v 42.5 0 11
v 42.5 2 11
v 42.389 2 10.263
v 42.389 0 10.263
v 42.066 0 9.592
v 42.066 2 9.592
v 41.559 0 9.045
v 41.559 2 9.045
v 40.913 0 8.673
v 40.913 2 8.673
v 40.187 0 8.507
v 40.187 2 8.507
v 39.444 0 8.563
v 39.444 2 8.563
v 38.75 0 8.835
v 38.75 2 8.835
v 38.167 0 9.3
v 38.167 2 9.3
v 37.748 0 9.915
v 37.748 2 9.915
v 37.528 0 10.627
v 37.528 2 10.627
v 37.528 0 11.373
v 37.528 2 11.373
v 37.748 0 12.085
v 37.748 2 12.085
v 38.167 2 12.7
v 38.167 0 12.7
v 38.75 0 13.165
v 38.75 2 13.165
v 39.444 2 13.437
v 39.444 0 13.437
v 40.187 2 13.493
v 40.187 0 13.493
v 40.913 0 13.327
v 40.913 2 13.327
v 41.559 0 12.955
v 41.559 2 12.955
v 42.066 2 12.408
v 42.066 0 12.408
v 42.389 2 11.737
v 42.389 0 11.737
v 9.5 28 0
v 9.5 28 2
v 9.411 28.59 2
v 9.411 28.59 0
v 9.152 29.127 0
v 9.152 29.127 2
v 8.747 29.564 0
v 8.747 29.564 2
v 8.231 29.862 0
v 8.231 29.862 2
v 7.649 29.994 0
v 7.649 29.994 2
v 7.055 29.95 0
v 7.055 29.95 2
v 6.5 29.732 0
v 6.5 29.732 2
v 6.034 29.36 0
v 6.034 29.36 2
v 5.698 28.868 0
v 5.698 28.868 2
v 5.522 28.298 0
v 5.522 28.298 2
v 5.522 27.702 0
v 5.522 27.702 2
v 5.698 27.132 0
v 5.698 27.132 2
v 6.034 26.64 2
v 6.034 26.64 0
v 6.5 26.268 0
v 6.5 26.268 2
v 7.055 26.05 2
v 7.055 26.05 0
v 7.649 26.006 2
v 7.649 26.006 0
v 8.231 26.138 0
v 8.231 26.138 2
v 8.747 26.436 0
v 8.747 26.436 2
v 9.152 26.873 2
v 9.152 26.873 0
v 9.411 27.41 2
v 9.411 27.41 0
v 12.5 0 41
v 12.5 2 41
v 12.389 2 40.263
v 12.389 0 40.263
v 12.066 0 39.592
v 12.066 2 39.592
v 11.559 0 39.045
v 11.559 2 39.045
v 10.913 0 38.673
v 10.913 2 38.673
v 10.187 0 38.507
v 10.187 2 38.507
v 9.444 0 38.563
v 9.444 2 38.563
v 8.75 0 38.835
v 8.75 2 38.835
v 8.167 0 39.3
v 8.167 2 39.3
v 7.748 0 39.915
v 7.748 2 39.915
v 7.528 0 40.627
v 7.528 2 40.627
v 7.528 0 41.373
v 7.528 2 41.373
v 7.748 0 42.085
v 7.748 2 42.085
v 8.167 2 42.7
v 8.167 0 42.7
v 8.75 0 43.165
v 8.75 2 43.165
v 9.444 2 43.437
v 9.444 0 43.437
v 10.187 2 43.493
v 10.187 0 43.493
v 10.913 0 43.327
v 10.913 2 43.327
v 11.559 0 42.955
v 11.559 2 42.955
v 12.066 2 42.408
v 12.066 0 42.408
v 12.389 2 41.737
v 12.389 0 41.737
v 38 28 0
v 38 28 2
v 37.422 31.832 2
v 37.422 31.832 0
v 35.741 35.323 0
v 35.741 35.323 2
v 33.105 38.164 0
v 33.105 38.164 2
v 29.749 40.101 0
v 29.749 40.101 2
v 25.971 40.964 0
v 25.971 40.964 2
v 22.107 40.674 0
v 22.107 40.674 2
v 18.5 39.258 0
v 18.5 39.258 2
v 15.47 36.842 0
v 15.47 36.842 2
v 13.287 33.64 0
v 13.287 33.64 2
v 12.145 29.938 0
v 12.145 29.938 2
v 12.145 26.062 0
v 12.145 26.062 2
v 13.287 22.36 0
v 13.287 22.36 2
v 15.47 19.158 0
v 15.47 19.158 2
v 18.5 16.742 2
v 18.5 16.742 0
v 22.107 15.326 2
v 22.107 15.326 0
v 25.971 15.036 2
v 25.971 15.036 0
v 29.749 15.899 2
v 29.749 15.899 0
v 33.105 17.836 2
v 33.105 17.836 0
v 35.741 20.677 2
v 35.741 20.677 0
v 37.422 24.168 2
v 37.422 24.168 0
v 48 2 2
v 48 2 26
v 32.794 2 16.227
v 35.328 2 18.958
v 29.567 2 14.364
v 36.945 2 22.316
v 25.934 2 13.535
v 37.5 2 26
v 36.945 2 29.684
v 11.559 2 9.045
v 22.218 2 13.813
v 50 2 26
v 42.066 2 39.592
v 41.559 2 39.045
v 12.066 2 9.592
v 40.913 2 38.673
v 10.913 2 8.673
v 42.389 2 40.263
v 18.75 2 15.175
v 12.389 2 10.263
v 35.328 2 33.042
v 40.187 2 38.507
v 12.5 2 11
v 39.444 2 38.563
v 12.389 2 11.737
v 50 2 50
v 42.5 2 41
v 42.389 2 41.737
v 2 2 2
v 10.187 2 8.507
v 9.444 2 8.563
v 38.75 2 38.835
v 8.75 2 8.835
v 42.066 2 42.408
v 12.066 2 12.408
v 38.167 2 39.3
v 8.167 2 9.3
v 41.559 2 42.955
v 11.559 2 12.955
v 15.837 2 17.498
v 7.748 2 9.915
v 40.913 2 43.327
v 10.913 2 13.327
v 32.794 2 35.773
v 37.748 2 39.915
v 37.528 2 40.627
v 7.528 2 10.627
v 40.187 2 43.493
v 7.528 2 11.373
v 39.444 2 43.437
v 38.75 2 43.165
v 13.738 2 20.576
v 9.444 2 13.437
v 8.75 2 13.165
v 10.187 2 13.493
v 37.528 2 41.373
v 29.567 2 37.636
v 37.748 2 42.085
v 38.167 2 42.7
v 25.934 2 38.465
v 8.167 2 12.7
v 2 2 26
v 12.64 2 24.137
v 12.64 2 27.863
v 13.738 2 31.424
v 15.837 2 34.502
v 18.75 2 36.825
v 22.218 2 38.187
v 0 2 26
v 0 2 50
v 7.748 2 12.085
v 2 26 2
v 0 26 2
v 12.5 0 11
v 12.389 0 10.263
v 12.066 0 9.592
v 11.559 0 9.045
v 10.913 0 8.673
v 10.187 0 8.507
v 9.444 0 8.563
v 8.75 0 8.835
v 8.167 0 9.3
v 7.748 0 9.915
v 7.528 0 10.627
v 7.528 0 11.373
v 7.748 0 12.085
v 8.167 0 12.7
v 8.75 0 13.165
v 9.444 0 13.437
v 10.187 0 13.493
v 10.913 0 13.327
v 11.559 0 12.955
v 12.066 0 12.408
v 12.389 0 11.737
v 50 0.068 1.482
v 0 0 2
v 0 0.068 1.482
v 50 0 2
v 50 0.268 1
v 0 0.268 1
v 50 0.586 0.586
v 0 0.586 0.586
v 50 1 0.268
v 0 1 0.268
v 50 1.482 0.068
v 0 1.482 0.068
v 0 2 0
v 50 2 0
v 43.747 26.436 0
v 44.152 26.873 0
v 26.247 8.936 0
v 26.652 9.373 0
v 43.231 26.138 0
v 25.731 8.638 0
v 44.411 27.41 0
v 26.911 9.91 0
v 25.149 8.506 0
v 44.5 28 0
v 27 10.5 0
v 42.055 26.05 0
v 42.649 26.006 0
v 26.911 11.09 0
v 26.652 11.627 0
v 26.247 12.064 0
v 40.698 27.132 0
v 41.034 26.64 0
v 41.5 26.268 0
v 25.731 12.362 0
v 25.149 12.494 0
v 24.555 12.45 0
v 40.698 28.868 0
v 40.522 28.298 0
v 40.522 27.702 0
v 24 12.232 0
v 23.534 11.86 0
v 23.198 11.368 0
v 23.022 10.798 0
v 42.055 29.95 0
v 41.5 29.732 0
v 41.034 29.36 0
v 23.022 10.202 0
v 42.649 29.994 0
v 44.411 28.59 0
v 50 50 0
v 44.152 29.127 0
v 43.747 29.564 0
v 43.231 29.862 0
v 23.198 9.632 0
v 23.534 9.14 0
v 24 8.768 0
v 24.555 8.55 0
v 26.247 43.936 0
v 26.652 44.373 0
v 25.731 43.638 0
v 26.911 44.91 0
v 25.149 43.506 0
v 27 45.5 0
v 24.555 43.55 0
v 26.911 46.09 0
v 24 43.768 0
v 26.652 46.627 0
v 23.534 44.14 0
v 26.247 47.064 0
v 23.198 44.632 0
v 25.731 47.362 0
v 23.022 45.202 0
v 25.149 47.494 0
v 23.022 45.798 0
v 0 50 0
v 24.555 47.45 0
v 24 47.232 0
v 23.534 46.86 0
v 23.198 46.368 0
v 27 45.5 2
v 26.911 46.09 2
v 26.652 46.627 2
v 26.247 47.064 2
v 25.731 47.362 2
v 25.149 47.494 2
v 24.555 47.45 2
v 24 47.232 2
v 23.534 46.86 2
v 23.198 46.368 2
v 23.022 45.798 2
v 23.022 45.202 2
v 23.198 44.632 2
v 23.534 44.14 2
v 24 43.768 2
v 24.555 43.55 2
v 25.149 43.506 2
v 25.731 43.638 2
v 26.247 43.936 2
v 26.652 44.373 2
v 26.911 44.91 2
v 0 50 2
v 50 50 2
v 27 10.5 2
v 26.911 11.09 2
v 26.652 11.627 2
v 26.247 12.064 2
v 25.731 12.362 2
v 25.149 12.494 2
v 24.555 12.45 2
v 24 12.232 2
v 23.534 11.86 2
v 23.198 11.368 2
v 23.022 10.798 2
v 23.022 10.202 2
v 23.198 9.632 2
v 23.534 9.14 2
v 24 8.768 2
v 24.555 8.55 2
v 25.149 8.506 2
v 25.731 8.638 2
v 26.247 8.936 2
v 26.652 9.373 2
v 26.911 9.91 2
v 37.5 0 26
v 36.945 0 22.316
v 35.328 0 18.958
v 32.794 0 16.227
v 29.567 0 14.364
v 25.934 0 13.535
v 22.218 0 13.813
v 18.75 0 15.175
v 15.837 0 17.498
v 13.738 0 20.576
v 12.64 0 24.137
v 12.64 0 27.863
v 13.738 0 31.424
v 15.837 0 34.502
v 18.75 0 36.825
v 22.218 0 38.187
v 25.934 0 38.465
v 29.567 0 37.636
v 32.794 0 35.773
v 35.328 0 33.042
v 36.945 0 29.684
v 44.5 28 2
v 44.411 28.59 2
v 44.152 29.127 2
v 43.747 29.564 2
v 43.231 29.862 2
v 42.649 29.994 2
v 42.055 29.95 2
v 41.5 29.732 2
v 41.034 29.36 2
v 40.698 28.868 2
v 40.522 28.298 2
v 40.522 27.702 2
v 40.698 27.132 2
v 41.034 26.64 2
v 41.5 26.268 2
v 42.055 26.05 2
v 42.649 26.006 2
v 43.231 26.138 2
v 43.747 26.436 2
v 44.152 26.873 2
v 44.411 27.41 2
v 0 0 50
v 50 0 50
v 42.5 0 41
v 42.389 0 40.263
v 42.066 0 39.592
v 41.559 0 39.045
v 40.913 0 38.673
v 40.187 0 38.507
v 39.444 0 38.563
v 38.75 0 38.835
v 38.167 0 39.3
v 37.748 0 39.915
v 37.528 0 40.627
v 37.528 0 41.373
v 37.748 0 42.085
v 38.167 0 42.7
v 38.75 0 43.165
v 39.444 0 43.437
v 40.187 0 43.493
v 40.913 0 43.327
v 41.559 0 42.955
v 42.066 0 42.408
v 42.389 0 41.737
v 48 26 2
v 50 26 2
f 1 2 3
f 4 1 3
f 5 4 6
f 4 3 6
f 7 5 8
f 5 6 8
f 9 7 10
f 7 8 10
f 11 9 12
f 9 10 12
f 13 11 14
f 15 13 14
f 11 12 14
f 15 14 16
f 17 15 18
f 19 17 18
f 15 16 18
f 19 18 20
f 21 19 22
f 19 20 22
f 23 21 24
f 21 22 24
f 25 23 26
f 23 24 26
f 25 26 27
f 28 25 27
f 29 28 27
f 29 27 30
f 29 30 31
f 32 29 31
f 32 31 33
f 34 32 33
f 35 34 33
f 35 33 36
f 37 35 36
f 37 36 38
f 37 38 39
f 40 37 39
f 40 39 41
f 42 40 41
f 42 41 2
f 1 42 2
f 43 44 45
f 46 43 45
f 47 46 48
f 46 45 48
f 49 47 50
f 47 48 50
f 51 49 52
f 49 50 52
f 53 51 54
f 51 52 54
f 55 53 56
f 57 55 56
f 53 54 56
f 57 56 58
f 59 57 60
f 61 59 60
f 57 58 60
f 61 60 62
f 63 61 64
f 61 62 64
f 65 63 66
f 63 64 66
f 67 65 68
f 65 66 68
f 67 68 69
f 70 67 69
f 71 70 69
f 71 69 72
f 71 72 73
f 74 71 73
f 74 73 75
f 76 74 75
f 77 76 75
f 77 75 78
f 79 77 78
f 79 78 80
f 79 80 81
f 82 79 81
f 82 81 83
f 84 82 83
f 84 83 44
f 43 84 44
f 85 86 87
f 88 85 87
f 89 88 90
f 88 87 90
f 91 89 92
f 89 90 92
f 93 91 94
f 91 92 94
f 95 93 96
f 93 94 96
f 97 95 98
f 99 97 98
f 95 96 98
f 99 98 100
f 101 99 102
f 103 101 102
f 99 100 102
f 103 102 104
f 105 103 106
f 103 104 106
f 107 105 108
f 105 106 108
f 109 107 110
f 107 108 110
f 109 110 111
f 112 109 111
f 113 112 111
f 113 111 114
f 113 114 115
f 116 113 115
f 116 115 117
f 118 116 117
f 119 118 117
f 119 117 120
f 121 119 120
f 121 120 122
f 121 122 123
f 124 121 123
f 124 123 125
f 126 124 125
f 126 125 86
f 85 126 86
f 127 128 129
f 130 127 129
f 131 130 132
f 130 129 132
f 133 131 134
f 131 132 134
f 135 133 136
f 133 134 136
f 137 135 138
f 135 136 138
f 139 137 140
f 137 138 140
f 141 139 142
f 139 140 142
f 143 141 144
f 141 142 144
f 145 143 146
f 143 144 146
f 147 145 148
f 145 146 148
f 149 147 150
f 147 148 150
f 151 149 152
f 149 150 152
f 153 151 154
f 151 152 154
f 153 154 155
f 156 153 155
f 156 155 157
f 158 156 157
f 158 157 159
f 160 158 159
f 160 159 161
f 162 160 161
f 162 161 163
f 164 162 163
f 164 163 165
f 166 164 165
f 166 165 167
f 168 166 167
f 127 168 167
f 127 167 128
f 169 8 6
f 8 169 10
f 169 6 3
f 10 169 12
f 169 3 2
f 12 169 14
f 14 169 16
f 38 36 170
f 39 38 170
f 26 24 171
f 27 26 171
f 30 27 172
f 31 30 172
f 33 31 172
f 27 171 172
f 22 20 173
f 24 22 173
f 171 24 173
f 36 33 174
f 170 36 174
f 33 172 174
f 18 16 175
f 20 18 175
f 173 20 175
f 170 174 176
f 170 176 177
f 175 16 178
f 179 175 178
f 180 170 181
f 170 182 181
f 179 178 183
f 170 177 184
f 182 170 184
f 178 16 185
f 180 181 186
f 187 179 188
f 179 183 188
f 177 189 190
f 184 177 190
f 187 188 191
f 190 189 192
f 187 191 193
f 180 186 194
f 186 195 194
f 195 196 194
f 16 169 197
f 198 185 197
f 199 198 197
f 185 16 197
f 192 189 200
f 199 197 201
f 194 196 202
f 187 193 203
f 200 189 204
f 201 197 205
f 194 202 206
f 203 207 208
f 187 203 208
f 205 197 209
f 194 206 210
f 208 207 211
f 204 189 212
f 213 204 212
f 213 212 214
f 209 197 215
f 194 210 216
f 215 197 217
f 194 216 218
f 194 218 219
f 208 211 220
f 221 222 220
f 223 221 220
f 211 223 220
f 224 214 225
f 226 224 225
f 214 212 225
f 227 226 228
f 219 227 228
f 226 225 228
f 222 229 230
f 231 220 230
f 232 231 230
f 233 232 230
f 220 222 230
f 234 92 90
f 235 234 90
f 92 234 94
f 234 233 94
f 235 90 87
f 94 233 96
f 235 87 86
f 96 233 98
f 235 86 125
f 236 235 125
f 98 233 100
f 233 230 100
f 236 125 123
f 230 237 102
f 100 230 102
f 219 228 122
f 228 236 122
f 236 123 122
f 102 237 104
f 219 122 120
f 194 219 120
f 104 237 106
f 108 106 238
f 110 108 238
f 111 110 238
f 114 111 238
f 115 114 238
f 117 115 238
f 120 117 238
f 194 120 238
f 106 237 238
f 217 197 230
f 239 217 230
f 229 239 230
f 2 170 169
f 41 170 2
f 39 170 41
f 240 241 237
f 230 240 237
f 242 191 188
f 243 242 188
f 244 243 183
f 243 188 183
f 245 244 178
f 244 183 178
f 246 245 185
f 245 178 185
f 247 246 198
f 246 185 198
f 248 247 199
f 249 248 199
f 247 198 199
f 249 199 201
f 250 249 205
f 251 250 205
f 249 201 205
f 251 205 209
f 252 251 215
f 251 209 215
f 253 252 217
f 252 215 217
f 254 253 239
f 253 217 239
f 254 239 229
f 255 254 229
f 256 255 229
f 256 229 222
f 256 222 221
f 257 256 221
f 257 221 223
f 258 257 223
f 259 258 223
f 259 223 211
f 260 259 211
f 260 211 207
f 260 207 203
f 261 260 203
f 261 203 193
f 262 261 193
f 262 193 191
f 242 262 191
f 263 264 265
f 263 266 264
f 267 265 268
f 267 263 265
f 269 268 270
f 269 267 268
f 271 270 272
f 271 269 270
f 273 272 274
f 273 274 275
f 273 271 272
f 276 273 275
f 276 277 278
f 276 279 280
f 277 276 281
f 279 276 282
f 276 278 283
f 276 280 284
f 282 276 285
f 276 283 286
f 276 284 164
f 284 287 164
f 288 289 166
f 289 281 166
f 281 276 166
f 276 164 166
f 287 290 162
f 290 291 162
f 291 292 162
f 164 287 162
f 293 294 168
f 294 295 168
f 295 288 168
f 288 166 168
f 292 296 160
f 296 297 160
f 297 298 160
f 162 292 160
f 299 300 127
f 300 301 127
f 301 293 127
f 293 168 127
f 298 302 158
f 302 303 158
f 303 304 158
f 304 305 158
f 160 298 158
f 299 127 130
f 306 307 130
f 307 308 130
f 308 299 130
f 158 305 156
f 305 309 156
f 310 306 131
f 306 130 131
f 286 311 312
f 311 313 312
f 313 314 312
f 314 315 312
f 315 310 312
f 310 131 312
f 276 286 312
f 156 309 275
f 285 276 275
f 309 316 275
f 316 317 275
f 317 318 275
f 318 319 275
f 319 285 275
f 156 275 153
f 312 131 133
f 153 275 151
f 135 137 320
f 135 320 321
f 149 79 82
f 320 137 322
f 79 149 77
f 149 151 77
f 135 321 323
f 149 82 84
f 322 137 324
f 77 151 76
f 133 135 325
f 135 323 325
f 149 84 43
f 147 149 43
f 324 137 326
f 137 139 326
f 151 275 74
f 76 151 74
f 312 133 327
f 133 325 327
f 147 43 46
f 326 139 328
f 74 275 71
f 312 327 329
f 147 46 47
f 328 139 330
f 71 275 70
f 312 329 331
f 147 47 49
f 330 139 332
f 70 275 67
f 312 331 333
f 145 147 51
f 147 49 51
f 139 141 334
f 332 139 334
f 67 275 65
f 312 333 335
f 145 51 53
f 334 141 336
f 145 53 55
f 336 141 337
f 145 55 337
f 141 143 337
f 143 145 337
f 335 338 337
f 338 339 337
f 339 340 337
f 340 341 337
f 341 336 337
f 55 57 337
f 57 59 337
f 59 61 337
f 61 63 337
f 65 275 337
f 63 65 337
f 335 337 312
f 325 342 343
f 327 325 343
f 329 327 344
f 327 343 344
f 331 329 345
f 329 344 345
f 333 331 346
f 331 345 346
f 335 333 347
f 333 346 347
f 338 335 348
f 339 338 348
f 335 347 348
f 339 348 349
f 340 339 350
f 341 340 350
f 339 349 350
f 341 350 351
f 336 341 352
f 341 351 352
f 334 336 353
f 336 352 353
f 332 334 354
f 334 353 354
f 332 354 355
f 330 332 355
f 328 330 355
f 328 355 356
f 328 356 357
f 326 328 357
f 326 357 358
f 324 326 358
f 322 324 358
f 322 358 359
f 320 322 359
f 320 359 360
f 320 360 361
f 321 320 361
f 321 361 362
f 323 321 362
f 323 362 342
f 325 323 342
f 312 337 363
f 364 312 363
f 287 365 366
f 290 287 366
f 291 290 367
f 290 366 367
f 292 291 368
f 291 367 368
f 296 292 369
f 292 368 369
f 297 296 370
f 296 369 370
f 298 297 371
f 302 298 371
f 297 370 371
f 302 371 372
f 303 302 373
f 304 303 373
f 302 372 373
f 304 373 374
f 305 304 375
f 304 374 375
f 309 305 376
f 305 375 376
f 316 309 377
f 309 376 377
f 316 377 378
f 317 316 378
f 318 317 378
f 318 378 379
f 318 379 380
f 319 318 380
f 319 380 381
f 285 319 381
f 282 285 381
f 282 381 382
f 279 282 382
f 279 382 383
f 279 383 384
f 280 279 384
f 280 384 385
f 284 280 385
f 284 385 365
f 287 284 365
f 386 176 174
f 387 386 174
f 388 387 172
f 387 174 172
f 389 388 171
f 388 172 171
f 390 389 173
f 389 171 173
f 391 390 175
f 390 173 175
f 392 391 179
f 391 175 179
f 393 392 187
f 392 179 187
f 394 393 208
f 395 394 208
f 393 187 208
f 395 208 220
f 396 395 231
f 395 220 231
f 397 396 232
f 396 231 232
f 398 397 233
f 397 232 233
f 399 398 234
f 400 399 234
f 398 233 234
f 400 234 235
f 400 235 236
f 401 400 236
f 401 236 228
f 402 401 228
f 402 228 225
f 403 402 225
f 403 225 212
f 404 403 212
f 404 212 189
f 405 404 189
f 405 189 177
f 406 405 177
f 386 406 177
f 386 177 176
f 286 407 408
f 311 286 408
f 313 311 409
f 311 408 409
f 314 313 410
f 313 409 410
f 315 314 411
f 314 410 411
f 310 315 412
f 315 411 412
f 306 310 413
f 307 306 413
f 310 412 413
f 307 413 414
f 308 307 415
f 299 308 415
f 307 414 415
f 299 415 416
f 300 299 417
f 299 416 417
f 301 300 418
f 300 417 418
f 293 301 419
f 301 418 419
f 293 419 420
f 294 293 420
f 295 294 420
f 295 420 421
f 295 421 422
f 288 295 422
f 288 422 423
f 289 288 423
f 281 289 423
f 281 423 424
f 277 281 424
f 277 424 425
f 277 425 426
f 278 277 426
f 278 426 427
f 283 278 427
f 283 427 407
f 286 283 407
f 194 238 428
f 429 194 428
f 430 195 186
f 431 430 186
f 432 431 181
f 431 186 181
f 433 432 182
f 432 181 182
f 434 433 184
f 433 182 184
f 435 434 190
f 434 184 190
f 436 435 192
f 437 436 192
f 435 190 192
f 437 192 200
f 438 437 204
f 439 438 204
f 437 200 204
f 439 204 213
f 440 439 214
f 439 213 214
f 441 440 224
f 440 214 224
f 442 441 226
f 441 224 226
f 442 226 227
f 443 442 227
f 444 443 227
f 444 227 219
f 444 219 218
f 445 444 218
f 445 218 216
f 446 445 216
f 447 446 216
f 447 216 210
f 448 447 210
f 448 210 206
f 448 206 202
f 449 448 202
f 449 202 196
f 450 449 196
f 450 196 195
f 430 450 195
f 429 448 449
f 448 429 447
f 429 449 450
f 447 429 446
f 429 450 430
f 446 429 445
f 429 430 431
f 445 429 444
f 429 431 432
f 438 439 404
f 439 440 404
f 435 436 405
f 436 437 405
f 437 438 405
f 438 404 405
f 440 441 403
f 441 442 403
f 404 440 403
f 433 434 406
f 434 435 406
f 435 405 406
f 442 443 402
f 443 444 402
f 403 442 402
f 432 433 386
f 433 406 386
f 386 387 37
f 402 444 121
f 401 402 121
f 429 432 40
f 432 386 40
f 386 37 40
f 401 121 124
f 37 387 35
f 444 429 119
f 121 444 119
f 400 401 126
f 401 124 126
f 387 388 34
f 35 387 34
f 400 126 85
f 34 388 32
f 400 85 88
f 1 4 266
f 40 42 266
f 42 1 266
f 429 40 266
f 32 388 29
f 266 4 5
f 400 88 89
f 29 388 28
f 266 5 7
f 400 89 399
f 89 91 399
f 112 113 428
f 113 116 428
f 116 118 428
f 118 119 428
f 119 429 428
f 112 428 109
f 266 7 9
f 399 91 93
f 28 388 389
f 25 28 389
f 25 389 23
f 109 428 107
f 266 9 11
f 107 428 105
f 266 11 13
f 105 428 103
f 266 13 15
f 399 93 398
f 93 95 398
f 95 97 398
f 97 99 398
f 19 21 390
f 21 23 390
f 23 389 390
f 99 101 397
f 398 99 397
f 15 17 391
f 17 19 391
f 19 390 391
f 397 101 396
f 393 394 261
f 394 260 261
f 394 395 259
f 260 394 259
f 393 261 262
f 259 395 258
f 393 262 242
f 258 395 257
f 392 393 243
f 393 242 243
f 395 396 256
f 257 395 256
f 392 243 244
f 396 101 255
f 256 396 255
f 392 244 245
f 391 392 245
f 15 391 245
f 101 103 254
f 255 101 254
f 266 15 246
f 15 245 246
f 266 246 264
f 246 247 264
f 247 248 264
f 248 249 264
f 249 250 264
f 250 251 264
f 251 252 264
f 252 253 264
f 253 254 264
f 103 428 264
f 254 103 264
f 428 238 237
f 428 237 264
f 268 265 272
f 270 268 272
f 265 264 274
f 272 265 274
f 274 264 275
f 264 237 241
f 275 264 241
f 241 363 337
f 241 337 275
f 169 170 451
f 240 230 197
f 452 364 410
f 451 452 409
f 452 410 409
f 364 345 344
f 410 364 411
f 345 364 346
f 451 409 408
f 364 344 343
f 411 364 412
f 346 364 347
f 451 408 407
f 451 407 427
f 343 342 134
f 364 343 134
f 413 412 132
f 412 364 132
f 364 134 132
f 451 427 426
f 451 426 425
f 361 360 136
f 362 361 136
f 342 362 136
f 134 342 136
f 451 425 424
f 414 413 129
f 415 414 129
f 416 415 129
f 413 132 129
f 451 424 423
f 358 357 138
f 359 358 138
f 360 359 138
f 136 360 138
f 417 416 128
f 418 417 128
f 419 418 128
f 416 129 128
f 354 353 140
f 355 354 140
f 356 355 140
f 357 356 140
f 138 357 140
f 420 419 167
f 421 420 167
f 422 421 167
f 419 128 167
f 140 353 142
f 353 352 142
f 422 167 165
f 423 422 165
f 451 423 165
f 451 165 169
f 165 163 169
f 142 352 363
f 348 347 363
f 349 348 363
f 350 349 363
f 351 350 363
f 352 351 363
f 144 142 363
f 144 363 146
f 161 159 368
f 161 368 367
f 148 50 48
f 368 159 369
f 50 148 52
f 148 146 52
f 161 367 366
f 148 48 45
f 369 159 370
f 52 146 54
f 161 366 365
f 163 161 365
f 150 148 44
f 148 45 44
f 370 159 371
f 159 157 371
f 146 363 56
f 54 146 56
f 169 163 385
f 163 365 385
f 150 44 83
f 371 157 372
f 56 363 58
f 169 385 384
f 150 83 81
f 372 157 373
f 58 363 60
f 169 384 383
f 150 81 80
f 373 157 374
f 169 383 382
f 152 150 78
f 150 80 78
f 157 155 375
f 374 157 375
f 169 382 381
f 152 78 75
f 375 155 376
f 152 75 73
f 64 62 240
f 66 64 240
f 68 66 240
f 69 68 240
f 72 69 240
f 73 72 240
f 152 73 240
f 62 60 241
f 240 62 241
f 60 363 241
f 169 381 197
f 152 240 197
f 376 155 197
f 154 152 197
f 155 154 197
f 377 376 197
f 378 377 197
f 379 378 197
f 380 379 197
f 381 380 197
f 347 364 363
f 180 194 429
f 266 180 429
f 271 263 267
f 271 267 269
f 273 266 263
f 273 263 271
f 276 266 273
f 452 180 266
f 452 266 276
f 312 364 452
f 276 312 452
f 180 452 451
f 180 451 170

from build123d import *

# Parameters (mm, degrees)
EXTRUDE_1_DEPTH     = 50
EXTRUDE_2_DEPTH     = 2
EXTRUDE_4_DEPTH     = 2
SKETCH_4_R          = 13
SKETCH_4_R_2        = 2
CUT_EXTRUDE_1_DEPTH = 3
SKETCH_5_R          = 12.5
SKETCH_5_R_2        = 2.5
CUT_EXTRUDE_2_DEPTH = 3
FILLET_2_R          = 2


with BuildPart() as part:
    # 草图1 → 凸台-拉伸1 (new body)
    with BuildSketch(Plane(origin=(0, 0, 0), x_dir=(0, 0, -1), z_dir=(1, 0, 0))):
        Polygon((0, 0), (0, 50), (-2, 50), (-2, 2), (-50, 2), (-50, 0), align=None)
    extrude(amount=EXTRUDE_1_DEPTH)

    # 草图2 → 凸台-拉伸2 (add)
    with BuildSketch(Plane(origin=(50, 0, 0), x_dir=(0, 0, -1), z_dir=(1, 0, 0))):
        Polygon((-2, 26), (-26, 2), (-2, 2), align=None)
    extrude(amount=-EXTRUDE_2_DEPTH)

    # 草图3 → 凸台-拉伸4 (add)
    with BuildSketch(Plane.ZY):
        Polygon((2, 26), (26, 2), (2, 2), align=None)
    extrude(amount=-EXTRUDE_4_DEPTH)

    # 草图4 → 切除-拉伸1 (cut, through all)
    with BuildSketch(Plane.XY.offset(2)):
        with Locations((25, 28)):
            Circle(SKETCH_4_R)
        with Locations((25, 45.5)):
            Circle(SKETCH_4_R_2)
        with Locations((42.5, 28)):
            Circle(SKETCH_4_R_2)
        with Locations((25, 10.5)):
            Circle(SKETCH_4_R_2)
        with Locations((7.5, 28)):
            Circle(SKETCH_4_R_2)
    extrude(amount=-CUT_EXTRUDE_1_DEPTH, mode=Mode.SUBTRACT)

    # 草图5 → 切除-拉伸2 (cut, through all)
    with BuildSketch(Plane(origin=(0, 2, 0), x_dir=(1, 0, 0), z_dir=(0, 1, 0))):
        with Locations((25, -26)):
            Circle(SKETCH_5_R)
        with Locations((10, -11)):
            Circle(SKETCH_5_R_2)
        with Locations((40, -11)):
            Circle(SKETCH_5_R_2)
        with Locations((40, -41)):
            Circle(SKETCH_5_R_2)
        with Locations((10, -41)):
            Circle(SKETCH_5_R_2)
    extrude(amount=-CUT_EXTRUDE_2_DEPTH, mode=Mode.SUBTRACT)

    # 圆角2
    fillet_2_edges = [part.edges().sort_by_distance(p)[0] for p in [
        (25, 0, 0),
    ]]
    fillet(fillet_2_edges, radius=FILLET_2_R)


solid = part.part
